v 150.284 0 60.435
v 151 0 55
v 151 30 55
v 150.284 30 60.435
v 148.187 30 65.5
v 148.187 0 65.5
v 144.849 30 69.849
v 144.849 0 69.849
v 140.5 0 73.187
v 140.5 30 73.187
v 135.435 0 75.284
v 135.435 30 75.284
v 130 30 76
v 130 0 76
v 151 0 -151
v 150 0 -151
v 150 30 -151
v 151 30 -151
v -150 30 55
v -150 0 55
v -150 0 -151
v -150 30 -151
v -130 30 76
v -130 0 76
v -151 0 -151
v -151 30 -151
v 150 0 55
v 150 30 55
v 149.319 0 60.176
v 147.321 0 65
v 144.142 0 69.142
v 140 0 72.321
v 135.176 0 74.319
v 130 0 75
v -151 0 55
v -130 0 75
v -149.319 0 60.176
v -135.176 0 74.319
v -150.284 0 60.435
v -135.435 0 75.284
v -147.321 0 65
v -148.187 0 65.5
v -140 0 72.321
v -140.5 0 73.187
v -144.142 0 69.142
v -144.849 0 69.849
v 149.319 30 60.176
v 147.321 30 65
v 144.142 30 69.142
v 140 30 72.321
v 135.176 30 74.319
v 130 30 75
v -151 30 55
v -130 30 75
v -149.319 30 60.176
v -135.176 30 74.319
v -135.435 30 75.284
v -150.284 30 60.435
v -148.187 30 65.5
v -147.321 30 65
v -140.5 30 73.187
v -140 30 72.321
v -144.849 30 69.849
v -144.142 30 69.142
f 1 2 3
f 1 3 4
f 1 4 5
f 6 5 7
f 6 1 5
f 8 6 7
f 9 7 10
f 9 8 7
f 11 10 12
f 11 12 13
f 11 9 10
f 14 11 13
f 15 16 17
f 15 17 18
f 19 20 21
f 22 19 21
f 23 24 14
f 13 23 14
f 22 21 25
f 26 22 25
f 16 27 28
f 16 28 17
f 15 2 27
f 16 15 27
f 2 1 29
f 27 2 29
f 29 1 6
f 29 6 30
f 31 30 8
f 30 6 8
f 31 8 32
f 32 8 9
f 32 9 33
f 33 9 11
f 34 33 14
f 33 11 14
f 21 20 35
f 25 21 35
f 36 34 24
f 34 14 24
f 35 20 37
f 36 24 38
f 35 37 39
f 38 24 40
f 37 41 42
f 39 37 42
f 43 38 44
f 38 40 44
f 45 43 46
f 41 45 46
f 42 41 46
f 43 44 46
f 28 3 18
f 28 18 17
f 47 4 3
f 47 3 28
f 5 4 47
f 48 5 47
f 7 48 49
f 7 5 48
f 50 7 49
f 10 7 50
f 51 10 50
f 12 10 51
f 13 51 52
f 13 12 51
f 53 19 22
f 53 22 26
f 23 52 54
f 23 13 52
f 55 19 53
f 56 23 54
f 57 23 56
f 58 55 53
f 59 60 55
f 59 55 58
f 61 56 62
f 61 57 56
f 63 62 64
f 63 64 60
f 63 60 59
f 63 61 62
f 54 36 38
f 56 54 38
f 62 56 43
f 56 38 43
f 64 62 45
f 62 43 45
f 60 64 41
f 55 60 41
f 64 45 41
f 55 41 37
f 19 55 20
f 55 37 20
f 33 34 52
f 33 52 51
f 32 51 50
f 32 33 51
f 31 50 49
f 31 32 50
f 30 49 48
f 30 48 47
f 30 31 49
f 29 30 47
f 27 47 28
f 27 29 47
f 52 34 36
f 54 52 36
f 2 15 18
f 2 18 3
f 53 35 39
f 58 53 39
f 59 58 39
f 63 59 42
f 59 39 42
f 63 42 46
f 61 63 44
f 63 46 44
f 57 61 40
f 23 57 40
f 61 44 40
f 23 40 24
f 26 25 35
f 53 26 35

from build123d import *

# Parameters (mm, degrees)
LINEAR_AUSTRAGEN_D_NN1_DEPTH = 30


with BuildPart() as part:
    # Skizze1 → Linear-Austragen-Dünn1 (new body)
    with BuildSketch(Plane.XZ):
        with BuildLine():
            Line((0, 75), (130, 75))
            ThreePointArc((130, 75), (144.142135624, 69.142135624), (150, 55))
            Line((150, 55), (150, -150))
            Line((150, -150), (150, -151))
            Line((150, -151), (151, -151))
            Line((151, -151), (151, -150))
            Line((151, -150), (151, 55))
            ThreePointArc((151, 55), (144.849242405, 69.849242405), (130, 76))
            Line((130, 76), (0, 76))
            Line((0, 76), (0, 75))
        make_face()
    linear_austragen_d_nn1 = extrude(amount=-LINEAR_AUSTRAGEN_D_NN1_DEPTH)

    # Spiegeln1: Linear-Austragen-Dünn1 across plane
    add(linear_austragen_d_nn1.mirror(Plane(origin=(0, 30, 75), x_dir=(0, 0, 1), z_dir=(1, 0, 0))))


solid = part.part
